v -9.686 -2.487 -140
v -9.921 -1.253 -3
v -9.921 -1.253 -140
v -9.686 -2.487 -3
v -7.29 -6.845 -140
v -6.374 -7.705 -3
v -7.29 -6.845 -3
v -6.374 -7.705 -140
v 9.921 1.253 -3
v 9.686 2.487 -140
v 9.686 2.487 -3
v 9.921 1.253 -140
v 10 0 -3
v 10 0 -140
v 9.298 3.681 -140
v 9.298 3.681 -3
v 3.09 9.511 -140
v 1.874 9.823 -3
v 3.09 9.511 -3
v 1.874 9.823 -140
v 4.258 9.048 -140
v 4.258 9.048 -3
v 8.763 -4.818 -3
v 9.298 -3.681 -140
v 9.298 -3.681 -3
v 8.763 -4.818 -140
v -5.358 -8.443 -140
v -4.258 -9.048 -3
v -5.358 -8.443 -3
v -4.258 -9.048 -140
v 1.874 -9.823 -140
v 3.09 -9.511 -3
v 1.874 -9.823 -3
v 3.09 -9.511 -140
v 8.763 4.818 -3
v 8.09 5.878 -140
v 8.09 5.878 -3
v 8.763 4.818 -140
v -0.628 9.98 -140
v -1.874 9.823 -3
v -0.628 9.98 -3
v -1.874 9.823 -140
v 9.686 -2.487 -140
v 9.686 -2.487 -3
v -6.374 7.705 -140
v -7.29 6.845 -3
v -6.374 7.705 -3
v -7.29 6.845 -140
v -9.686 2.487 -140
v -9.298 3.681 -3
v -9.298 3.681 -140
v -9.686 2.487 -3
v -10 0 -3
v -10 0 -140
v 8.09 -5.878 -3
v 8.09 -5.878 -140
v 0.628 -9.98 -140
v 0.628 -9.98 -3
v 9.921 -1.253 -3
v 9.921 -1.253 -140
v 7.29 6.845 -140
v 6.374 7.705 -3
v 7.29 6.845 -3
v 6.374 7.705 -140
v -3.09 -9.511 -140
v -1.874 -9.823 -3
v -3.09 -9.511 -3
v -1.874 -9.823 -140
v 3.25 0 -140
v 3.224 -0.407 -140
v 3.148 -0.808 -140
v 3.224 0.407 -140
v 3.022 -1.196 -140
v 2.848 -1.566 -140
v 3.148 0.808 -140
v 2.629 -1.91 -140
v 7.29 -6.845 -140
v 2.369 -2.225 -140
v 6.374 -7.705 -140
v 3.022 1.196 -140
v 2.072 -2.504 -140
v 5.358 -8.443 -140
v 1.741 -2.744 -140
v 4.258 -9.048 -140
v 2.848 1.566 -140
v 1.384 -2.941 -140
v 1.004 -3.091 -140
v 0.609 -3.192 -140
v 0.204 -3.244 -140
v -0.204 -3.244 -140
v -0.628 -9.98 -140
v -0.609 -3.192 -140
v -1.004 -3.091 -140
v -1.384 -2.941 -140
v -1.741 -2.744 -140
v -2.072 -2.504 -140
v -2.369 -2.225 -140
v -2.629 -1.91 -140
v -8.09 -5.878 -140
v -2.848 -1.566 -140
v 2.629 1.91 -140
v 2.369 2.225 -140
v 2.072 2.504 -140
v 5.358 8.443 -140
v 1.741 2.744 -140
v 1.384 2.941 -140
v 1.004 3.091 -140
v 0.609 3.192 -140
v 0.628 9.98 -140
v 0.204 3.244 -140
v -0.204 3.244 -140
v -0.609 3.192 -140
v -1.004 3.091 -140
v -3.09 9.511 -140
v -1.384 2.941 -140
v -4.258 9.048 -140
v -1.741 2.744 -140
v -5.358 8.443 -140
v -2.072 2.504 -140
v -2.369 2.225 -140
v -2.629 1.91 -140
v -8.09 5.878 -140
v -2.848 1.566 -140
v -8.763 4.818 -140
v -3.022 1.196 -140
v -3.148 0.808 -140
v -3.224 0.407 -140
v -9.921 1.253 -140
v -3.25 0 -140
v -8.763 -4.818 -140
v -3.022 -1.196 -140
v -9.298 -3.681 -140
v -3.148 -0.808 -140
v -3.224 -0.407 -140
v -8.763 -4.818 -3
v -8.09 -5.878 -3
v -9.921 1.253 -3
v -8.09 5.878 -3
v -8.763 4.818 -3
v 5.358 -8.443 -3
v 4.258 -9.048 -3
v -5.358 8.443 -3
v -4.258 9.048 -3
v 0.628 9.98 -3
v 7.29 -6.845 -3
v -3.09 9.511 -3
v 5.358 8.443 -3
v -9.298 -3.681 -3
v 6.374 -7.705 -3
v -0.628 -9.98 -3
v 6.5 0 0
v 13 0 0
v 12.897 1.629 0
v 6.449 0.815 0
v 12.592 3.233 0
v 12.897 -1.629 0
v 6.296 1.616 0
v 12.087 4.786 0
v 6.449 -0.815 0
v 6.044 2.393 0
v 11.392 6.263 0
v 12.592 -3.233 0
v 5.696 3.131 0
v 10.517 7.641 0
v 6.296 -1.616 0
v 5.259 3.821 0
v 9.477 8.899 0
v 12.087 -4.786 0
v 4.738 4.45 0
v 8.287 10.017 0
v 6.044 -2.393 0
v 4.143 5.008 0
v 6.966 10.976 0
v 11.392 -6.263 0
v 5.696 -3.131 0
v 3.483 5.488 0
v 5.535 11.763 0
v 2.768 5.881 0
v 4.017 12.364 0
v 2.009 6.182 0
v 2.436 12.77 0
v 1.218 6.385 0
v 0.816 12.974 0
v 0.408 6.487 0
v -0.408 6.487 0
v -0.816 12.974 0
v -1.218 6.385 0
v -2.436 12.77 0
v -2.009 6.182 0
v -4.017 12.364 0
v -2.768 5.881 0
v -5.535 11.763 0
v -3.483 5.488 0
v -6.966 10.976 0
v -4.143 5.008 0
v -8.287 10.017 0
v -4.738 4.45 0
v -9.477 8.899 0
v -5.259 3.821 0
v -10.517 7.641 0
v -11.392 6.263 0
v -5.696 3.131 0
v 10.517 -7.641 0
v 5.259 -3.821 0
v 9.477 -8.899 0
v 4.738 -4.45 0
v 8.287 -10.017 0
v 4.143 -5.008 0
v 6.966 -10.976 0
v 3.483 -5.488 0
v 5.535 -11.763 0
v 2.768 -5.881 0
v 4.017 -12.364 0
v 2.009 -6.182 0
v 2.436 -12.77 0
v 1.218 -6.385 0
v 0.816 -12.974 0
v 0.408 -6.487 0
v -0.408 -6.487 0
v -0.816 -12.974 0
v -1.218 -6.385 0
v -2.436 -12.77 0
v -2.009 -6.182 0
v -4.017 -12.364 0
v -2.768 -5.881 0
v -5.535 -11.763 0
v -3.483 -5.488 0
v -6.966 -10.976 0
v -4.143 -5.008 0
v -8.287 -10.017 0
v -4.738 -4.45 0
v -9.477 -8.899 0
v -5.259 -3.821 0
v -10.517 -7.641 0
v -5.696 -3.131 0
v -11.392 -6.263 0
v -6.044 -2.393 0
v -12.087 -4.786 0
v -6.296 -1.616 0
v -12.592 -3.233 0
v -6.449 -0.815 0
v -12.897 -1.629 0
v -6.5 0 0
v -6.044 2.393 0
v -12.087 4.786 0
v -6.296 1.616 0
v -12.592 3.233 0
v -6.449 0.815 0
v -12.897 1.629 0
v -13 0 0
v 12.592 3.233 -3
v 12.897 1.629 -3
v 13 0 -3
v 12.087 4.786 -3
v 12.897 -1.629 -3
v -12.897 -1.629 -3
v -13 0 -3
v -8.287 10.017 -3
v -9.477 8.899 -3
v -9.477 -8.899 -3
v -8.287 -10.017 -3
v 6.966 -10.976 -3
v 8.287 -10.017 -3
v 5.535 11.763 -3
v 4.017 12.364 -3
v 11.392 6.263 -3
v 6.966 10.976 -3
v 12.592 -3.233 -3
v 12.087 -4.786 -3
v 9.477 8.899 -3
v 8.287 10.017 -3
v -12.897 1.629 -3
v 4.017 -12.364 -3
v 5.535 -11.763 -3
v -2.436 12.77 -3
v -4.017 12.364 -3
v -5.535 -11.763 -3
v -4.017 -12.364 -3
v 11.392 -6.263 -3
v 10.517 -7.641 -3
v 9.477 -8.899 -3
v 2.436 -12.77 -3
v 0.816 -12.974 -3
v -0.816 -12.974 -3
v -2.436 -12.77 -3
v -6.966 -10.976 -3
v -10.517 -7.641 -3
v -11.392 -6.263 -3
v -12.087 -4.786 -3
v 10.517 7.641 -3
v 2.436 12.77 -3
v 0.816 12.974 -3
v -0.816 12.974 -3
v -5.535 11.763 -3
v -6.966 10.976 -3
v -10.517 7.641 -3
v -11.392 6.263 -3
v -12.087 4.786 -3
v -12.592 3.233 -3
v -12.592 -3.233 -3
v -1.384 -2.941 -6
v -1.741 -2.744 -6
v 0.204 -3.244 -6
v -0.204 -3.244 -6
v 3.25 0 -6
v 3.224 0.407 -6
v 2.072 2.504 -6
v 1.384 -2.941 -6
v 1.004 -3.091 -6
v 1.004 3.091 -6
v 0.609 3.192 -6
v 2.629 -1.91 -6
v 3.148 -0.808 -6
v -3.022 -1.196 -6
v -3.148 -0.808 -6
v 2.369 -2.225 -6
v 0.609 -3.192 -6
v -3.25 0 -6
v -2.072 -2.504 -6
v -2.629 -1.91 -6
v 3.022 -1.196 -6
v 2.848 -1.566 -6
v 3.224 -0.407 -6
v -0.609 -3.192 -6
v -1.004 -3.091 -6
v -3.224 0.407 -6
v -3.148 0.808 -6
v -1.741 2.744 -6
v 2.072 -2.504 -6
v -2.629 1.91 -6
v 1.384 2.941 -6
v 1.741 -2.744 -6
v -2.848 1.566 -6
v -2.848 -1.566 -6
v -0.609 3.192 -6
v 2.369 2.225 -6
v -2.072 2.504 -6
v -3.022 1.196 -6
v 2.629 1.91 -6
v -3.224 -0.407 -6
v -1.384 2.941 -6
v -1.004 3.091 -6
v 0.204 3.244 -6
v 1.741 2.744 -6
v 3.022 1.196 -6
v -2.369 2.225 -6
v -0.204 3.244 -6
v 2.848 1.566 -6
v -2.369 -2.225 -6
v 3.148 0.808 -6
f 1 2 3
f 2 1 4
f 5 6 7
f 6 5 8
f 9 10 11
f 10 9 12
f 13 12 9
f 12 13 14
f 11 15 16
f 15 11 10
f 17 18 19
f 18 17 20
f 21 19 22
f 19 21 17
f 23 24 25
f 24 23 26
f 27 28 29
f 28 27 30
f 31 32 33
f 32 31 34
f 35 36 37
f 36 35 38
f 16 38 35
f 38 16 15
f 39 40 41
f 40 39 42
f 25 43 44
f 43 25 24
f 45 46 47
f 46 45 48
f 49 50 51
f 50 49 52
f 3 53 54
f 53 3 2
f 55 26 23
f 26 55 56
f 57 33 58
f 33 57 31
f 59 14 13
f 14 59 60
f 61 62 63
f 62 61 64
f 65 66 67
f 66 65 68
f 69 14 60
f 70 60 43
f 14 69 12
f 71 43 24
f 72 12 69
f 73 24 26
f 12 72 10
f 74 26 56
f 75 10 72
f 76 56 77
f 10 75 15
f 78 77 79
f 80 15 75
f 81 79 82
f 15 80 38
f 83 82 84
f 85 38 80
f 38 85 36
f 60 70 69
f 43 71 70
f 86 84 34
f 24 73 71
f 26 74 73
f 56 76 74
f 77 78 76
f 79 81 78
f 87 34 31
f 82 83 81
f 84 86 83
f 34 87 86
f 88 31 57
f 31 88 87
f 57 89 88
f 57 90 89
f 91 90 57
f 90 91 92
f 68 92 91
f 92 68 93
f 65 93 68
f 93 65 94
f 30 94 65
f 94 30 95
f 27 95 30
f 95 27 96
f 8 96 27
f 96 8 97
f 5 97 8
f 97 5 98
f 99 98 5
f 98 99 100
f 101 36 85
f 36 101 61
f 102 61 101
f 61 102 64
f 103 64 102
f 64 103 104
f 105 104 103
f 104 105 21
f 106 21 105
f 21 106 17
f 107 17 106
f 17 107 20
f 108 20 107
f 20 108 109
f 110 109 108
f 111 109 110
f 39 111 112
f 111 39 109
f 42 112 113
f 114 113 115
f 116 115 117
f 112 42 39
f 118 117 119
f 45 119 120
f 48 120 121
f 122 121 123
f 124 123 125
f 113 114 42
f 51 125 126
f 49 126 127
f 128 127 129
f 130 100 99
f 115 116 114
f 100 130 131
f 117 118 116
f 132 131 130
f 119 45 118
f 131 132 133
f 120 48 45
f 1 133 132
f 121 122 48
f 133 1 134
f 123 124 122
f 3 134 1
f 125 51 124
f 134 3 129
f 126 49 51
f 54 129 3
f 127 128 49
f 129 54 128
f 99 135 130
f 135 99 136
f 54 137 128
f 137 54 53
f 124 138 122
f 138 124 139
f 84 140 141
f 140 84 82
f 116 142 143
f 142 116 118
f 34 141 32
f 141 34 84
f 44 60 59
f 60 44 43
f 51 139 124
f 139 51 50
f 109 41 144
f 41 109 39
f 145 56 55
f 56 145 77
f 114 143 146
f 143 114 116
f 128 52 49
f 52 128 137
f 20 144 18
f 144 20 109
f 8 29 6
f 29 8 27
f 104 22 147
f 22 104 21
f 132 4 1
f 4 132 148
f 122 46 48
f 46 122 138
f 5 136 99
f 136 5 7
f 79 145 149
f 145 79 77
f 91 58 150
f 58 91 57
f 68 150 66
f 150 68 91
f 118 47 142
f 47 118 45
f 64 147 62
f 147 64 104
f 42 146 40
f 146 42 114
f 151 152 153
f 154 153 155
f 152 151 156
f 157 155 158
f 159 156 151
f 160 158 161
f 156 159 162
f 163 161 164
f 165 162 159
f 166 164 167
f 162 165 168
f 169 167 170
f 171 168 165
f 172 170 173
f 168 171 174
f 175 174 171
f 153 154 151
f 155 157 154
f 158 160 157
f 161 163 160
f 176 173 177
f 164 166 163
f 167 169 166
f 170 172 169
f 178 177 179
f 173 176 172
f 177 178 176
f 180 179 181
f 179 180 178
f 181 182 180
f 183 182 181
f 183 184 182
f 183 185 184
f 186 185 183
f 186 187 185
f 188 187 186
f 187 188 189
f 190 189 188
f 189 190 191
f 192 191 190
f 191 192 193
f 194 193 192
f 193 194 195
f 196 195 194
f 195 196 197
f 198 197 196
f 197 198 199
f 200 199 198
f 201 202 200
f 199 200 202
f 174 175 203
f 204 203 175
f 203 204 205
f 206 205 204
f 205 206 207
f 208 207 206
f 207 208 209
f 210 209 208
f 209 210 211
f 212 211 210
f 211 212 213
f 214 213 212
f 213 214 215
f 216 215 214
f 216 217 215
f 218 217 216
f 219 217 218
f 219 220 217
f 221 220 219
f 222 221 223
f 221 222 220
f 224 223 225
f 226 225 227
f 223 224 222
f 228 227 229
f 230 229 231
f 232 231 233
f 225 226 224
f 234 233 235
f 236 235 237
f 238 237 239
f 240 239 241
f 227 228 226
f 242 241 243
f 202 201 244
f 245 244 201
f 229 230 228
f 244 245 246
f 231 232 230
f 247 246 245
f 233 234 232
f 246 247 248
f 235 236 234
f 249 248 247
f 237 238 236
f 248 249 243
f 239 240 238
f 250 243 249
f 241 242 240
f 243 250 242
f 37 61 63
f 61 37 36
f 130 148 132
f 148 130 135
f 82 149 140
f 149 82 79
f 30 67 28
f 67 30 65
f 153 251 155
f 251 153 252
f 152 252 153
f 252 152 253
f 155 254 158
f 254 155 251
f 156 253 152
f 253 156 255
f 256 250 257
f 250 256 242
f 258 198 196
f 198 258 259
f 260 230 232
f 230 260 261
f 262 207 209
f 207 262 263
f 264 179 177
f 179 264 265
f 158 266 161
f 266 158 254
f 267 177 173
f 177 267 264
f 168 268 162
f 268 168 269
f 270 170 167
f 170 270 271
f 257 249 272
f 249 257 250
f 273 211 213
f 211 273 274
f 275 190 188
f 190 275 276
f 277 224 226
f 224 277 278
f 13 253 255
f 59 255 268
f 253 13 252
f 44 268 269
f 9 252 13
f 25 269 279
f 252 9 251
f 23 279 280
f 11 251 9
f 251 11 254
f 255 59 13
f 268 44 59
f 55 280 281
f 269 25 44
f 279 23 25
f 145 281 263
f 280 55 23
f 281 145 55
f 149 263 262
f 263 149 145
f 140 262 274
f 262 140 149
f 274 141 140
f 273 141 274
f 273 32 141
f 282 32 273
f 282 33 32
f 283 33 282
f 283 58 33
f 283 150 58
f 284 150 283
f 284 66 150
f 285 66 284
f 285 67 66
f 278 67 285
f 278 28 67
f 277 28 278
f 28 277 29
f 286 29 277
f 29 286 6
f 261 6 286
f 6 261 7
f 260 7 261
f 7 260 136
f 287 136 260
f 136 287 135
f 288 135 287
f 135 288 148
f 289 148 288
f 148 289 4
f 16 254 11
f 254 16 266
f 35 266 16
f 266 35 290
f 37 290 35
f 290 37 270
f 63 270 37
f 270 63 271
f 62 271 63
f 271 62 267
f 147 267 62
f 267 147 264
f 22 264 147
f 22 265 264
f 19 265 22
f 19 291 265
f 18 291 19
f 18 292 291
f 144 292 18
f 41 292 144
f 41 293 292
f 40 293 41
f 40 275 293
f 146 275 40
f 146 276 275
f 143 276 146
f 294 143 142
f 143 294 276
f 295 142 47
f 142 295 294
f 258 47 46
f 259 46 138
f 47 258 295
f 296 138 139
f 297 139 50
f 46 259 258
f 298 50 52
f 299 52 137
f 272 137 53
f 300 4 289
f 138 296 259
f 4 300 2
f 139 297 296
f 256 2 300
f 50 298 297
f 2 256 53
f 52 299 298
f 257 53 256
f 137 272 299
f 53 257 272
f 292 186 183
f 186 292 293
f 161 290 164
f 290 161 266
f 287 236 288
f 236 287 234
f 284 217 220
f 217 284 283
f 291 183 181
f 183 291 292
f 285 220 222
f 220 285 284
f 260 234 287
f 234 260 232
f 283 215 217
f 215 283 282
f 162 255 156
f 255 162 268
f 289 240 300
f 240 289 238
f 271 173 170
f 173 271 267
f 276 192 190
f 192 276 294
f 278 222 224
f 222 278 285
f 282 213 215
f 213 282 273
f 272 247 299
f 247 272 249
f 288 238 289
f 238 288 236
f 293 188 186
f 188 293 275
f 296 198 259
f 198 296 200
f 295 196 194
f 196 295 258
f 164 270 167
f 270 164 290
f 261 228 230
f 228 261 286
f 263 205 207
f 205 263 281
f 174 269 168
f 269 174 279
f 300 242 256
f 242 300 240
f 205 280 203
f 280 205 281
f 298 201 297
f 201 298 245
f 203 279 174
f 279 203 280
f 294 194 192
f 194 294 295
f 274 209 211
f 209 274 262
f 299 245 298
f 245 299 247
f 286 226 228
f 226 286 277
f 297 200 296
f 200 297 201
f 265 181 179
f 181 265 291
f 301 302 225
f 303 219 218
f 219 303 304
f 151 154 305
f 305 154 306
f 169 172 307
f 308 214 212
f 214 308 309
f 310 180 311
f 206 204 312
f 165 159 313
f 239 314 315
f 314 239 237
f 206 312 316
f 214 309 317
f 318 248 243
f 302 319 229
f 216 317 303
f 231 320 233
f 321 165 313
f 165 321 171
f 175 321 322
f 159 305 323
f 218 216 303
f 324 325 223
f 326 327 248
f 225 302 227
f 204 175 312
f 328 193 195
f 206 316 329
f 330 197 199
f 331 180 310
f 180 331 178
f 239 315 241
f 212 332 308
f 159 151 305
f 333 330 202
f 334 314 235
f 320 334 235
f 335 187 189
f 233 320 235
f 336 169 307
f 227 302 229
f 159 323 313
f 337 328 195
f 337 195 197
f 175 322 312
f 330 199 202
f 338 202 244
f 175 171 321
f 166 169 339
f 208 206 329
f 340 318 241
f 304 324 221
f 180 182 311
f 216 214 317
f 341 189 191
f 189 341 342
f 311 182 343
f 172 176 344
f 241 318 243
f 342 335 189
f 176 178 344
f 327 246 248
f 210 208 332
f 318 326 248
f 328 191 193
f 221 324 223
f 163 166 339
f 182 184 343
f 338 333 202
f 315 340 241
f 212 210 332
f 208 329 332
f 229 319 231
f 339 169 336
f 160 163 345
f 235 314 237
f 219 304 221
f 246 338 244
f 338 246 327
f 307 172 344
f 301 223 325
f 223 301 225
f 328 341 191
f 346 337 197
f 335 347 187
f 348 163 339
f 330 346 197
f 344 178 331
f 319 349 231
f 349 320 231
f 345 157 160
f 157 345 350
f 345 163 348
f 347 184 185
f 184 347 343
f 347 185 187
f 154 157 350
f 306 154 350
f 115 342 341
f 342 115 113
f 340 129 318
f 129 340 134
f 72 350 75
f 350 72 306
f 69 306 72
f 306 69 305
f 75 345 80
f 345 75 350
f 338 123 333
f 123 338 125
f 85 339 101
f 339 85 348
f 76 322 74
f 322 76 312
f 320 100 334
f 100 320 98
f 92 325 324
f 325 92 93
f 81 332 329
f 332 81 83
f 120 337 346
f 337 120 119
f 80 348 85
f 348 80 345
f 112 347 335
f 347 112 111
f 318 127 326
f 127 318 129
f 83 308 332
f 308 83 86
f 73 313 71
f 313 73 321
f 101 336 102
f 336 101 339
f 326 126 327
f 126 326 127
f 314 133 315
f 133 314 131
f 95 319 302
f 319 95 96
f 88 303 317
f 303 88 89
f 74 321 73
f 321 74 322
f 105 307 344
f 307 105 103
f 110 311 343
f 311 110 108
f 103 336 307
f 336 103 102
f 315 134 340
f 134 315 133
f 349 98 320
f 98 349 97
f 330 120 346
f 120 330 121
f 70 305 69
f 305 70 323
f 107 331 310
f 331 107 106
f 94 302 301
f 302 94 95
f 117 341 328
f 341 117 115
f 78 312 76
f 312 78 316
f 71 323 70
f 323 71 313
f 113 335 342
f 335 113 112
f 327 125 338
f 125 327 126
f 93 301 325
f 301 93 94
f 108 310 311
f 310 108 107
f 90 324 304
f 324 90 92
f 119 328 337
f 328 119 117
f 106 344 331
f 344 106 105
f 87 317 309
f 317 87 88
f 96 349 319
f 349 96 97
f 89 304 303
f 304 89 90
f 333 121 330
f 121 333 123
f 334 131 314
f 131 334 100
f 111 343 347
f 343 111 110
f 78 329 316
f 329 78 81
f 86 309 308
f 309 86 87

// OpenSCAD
$fn = 50;


difference() {
	union() {
		translate(v = [0, 0, -140.0000000000]) {
			cylinder(h = 140, r = 10.0000000000);
		}
		translate(v = [0, 0, -3.0000000000]) {
			cylinder(h = 3, r = 13.0000000000);
		}
	}
	union() {
		translate(v = [0, 0, 0]) {
			rotate(a = [0, 0, 0]) {
				difference() {
					union() {
						#translate(v = [0, 0, -140.0000000000]) {
							cylinder(h = 140, r = 2.2500000000);
						}
						#translate(v = [0, 0, -6]) {
							cylinder(h = 6, r = 10.0000000000, r1 = 3.2500000000, r2 = 6.5000000000);
						}
						#translate(v = [0, 0, -140.0000000000]) {
							cylinder(h = 140, r = 3.2500000000);
						}
						#translate(v = [0, 0, -140.0000000000]) {
							cylinder(h = 140, r = 2.2500000000);
						}
					}
					union();
				}
			}
		}
	}
}
